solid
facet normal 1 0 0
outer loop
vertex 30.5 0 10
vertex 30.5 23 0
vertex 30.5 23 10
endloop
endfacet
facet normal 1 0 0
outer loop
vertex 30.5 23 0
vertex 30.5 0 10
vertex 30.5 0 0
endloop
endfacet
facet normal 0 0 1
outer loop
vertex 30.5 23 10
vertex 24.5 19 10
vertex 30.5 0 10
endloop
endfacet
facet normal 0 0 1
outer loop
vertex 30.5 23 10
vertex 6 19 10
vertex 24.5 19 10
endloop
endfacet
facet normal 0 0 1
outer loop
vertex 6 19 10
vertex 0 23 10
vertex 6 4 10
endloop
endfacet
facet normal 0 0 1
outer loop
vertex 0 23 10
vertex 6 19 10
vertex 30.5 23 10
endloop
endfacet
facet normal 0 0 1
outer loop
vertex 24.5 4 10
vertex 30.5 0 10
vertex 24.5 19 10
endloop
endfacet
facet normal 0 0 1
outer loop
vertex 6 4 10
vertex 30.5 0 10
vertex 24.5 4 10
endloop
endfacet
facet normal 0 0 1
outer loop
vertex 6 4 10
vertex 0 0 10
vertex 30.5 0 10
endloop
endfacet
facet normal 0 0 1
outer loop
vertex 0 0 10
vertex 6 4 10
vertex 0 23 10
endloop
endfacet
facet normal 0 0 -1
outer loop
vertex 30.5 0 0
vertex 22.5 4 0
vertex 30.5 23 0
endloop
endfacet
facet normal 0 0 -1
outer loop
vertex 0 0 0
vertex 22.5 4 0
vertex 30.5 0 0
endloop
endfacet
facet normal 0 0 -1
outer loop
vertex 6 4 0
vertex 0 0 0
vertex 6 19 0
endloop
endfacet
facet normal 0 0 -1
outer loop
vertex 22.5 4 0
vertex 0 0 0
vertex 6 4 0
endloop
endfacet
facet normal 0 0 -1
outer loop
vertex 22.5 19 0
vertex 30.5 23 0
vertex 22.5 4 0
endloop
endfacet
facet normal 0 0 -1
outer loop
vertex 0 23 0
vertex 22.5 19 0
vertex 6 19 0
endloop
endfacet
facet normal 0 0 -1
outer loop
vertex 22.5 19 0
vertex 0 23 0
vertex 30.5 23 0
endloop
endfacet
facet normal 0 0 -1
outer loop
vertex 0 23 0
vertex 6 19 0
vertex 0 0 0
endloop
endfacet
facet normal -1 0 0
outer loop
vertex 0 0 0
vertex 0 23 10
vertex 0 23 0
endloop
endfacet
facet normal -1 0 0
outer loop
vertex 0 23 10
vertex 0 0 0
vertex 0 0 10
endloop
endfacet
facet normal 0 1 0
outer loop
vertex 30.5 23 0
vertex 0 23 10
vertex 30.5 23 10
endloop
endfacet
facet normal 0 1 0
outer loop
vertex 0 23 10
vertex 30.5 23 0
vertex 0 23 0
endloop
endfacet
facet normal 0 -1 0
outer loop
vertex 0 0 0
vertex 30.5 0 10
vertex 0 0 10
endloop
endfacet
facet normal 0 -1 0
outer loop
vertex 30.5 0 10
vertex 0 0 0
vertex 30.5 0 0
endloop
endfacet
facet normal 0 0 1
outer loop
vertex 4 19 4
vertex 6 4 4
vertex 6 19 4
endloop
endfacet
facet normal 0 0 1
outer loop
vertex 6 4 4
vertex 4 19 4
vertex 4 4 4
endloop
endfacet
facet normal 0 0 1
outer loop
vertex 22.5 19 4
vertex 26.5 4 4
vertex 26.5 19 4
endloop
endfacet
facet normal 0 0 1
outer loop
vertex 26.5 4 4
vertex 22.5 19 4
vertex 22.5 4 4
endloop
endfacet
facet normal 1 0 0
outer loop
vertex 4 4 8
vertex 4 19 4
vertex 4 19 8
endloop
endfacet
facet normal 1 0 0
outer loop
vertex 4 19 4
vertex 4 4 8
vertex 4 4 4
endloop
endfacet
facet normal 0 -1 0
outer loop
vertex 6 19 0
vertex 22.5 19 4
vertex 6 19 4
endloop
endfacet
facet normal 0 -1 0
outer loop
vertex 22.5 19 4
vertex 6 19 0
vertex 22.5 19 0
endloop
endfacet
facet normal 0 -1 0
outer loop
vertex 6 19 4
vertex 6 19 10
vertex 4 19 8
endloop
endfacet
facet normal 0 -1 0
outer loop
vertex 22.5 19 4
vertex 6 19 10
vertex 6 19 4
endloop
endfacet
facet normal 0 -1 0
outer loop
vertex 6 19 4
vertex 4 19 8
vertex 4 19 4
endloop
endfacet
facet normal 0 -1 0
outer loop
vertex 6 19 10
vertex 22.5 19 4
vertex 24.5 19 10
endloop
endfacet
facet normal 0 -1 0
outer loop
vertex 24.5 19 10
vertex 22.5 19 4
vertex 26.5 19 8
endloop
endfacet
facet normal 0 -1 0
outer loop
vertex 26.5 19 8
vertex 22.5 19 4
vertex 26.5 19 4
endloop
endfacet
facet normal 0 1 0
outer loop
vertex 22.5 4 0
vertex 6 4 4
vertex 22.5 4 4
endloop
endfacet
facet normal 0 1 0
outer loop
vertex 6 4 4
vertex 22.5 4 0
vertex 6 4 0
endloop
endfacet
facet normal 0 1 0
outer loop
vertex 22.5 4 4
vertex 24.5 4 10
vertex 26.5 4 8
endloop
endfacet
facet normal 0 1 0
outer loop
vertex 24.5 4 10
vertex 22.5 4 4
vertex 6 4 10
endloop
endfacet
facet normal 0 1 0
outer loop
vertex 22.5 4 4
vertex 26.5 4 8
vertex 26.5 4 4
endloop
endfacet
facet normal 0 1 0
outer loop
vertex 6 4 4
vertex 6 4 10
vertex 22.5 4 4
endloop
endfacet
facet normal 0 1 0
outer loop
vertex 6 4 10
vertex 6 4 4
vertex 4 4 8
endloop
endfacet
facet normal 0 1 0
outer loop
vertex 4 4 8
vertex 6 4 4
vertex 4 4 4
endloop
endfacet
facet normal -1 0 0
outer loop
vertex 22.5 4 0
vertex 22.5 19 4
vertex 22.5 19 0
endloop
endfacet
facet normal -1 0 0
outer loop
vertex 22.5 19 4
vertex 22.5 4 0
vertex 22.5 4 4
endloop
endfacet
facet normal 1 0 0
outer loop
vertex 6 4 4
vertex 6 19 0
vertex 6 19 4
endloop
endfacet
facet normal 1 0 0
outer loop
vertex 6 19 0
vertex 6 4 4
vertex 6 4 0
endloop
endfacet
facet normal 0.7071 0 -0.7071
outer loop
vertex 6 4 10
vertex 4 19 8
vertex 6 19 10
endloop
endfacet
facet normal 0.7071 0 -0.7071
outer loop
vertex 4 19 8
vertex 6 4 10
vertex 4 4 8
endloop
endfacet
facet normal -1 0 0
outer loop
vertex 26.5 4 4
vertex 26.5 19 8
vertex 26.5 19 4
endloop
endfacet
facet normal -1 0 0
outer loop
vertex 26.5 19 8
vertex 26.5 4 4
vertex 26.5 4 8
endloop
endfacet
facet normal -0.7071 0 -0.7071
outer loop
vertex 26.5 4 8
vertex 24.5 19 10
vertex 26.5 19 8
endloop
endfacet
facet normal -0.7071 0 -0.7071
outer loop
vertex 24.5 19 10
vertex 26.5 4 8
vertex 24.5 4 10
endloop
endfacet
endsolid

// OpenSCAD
// Modified from "Mounting plate for keystone jack" by jsadusk
// https://www.thingiverse.com/thing:6647

jack_length =16.5;
jack_width = 15;

wall_height = 10;
wall_thickness = 4;

catch_overhang = 2;

small_clip_depth = catch_overhang;
big_clip_depth = catch_overhang + 2;
big_clip_clearance = 4;
small_clip_clearance = 6.5;

outer_length = jack_length + small_clip_depth + big_clip_depth +
                            (wall_thickness * 2);
outer_width = jack_width + (wall_thickness * 2);


module clip_catch() {
  rotate([90, 0, 0]) {
    linear_extrude(height = outer_width) {
      polygon(points = [[0,0],
                                       [catch_overhang,0],
                                       [wall_thickness,catch_overhang],
                                       [0,catch_overhang]],
                      paths = [[0,1,2,3]]);
    }
  }
}

module keystone() {
union() {

difference() {
  difference() {
   cube([outer_length, outer_width, wall_height]);
   translate([wall_thickness, wall_thickness, big_clip_clearance]) {
      cube([outer_length, jack_width, wall_height]);
    }
  }
  translate([wall_thickness + small_clip_depth, wall_thickness, -1]){
    cube([jack_length, jack_width, wall_height + 2]);
  }
}

*cube([wall_thickness, outer_width, wall_height]);

*cube([wall_thickness + small_clip_depth,
           outer_width, small_clip_clearance]);

translate([2, 23, 8]) {
  clip_catch();
}

translate([26.5,0,0]) {
  cube([4, 23, 10]);
}

translate([28.5, 0, 8]) {
  rotate([0, 0, -180]) {
    clip_catch();
  }
}


}
}

keystone();
